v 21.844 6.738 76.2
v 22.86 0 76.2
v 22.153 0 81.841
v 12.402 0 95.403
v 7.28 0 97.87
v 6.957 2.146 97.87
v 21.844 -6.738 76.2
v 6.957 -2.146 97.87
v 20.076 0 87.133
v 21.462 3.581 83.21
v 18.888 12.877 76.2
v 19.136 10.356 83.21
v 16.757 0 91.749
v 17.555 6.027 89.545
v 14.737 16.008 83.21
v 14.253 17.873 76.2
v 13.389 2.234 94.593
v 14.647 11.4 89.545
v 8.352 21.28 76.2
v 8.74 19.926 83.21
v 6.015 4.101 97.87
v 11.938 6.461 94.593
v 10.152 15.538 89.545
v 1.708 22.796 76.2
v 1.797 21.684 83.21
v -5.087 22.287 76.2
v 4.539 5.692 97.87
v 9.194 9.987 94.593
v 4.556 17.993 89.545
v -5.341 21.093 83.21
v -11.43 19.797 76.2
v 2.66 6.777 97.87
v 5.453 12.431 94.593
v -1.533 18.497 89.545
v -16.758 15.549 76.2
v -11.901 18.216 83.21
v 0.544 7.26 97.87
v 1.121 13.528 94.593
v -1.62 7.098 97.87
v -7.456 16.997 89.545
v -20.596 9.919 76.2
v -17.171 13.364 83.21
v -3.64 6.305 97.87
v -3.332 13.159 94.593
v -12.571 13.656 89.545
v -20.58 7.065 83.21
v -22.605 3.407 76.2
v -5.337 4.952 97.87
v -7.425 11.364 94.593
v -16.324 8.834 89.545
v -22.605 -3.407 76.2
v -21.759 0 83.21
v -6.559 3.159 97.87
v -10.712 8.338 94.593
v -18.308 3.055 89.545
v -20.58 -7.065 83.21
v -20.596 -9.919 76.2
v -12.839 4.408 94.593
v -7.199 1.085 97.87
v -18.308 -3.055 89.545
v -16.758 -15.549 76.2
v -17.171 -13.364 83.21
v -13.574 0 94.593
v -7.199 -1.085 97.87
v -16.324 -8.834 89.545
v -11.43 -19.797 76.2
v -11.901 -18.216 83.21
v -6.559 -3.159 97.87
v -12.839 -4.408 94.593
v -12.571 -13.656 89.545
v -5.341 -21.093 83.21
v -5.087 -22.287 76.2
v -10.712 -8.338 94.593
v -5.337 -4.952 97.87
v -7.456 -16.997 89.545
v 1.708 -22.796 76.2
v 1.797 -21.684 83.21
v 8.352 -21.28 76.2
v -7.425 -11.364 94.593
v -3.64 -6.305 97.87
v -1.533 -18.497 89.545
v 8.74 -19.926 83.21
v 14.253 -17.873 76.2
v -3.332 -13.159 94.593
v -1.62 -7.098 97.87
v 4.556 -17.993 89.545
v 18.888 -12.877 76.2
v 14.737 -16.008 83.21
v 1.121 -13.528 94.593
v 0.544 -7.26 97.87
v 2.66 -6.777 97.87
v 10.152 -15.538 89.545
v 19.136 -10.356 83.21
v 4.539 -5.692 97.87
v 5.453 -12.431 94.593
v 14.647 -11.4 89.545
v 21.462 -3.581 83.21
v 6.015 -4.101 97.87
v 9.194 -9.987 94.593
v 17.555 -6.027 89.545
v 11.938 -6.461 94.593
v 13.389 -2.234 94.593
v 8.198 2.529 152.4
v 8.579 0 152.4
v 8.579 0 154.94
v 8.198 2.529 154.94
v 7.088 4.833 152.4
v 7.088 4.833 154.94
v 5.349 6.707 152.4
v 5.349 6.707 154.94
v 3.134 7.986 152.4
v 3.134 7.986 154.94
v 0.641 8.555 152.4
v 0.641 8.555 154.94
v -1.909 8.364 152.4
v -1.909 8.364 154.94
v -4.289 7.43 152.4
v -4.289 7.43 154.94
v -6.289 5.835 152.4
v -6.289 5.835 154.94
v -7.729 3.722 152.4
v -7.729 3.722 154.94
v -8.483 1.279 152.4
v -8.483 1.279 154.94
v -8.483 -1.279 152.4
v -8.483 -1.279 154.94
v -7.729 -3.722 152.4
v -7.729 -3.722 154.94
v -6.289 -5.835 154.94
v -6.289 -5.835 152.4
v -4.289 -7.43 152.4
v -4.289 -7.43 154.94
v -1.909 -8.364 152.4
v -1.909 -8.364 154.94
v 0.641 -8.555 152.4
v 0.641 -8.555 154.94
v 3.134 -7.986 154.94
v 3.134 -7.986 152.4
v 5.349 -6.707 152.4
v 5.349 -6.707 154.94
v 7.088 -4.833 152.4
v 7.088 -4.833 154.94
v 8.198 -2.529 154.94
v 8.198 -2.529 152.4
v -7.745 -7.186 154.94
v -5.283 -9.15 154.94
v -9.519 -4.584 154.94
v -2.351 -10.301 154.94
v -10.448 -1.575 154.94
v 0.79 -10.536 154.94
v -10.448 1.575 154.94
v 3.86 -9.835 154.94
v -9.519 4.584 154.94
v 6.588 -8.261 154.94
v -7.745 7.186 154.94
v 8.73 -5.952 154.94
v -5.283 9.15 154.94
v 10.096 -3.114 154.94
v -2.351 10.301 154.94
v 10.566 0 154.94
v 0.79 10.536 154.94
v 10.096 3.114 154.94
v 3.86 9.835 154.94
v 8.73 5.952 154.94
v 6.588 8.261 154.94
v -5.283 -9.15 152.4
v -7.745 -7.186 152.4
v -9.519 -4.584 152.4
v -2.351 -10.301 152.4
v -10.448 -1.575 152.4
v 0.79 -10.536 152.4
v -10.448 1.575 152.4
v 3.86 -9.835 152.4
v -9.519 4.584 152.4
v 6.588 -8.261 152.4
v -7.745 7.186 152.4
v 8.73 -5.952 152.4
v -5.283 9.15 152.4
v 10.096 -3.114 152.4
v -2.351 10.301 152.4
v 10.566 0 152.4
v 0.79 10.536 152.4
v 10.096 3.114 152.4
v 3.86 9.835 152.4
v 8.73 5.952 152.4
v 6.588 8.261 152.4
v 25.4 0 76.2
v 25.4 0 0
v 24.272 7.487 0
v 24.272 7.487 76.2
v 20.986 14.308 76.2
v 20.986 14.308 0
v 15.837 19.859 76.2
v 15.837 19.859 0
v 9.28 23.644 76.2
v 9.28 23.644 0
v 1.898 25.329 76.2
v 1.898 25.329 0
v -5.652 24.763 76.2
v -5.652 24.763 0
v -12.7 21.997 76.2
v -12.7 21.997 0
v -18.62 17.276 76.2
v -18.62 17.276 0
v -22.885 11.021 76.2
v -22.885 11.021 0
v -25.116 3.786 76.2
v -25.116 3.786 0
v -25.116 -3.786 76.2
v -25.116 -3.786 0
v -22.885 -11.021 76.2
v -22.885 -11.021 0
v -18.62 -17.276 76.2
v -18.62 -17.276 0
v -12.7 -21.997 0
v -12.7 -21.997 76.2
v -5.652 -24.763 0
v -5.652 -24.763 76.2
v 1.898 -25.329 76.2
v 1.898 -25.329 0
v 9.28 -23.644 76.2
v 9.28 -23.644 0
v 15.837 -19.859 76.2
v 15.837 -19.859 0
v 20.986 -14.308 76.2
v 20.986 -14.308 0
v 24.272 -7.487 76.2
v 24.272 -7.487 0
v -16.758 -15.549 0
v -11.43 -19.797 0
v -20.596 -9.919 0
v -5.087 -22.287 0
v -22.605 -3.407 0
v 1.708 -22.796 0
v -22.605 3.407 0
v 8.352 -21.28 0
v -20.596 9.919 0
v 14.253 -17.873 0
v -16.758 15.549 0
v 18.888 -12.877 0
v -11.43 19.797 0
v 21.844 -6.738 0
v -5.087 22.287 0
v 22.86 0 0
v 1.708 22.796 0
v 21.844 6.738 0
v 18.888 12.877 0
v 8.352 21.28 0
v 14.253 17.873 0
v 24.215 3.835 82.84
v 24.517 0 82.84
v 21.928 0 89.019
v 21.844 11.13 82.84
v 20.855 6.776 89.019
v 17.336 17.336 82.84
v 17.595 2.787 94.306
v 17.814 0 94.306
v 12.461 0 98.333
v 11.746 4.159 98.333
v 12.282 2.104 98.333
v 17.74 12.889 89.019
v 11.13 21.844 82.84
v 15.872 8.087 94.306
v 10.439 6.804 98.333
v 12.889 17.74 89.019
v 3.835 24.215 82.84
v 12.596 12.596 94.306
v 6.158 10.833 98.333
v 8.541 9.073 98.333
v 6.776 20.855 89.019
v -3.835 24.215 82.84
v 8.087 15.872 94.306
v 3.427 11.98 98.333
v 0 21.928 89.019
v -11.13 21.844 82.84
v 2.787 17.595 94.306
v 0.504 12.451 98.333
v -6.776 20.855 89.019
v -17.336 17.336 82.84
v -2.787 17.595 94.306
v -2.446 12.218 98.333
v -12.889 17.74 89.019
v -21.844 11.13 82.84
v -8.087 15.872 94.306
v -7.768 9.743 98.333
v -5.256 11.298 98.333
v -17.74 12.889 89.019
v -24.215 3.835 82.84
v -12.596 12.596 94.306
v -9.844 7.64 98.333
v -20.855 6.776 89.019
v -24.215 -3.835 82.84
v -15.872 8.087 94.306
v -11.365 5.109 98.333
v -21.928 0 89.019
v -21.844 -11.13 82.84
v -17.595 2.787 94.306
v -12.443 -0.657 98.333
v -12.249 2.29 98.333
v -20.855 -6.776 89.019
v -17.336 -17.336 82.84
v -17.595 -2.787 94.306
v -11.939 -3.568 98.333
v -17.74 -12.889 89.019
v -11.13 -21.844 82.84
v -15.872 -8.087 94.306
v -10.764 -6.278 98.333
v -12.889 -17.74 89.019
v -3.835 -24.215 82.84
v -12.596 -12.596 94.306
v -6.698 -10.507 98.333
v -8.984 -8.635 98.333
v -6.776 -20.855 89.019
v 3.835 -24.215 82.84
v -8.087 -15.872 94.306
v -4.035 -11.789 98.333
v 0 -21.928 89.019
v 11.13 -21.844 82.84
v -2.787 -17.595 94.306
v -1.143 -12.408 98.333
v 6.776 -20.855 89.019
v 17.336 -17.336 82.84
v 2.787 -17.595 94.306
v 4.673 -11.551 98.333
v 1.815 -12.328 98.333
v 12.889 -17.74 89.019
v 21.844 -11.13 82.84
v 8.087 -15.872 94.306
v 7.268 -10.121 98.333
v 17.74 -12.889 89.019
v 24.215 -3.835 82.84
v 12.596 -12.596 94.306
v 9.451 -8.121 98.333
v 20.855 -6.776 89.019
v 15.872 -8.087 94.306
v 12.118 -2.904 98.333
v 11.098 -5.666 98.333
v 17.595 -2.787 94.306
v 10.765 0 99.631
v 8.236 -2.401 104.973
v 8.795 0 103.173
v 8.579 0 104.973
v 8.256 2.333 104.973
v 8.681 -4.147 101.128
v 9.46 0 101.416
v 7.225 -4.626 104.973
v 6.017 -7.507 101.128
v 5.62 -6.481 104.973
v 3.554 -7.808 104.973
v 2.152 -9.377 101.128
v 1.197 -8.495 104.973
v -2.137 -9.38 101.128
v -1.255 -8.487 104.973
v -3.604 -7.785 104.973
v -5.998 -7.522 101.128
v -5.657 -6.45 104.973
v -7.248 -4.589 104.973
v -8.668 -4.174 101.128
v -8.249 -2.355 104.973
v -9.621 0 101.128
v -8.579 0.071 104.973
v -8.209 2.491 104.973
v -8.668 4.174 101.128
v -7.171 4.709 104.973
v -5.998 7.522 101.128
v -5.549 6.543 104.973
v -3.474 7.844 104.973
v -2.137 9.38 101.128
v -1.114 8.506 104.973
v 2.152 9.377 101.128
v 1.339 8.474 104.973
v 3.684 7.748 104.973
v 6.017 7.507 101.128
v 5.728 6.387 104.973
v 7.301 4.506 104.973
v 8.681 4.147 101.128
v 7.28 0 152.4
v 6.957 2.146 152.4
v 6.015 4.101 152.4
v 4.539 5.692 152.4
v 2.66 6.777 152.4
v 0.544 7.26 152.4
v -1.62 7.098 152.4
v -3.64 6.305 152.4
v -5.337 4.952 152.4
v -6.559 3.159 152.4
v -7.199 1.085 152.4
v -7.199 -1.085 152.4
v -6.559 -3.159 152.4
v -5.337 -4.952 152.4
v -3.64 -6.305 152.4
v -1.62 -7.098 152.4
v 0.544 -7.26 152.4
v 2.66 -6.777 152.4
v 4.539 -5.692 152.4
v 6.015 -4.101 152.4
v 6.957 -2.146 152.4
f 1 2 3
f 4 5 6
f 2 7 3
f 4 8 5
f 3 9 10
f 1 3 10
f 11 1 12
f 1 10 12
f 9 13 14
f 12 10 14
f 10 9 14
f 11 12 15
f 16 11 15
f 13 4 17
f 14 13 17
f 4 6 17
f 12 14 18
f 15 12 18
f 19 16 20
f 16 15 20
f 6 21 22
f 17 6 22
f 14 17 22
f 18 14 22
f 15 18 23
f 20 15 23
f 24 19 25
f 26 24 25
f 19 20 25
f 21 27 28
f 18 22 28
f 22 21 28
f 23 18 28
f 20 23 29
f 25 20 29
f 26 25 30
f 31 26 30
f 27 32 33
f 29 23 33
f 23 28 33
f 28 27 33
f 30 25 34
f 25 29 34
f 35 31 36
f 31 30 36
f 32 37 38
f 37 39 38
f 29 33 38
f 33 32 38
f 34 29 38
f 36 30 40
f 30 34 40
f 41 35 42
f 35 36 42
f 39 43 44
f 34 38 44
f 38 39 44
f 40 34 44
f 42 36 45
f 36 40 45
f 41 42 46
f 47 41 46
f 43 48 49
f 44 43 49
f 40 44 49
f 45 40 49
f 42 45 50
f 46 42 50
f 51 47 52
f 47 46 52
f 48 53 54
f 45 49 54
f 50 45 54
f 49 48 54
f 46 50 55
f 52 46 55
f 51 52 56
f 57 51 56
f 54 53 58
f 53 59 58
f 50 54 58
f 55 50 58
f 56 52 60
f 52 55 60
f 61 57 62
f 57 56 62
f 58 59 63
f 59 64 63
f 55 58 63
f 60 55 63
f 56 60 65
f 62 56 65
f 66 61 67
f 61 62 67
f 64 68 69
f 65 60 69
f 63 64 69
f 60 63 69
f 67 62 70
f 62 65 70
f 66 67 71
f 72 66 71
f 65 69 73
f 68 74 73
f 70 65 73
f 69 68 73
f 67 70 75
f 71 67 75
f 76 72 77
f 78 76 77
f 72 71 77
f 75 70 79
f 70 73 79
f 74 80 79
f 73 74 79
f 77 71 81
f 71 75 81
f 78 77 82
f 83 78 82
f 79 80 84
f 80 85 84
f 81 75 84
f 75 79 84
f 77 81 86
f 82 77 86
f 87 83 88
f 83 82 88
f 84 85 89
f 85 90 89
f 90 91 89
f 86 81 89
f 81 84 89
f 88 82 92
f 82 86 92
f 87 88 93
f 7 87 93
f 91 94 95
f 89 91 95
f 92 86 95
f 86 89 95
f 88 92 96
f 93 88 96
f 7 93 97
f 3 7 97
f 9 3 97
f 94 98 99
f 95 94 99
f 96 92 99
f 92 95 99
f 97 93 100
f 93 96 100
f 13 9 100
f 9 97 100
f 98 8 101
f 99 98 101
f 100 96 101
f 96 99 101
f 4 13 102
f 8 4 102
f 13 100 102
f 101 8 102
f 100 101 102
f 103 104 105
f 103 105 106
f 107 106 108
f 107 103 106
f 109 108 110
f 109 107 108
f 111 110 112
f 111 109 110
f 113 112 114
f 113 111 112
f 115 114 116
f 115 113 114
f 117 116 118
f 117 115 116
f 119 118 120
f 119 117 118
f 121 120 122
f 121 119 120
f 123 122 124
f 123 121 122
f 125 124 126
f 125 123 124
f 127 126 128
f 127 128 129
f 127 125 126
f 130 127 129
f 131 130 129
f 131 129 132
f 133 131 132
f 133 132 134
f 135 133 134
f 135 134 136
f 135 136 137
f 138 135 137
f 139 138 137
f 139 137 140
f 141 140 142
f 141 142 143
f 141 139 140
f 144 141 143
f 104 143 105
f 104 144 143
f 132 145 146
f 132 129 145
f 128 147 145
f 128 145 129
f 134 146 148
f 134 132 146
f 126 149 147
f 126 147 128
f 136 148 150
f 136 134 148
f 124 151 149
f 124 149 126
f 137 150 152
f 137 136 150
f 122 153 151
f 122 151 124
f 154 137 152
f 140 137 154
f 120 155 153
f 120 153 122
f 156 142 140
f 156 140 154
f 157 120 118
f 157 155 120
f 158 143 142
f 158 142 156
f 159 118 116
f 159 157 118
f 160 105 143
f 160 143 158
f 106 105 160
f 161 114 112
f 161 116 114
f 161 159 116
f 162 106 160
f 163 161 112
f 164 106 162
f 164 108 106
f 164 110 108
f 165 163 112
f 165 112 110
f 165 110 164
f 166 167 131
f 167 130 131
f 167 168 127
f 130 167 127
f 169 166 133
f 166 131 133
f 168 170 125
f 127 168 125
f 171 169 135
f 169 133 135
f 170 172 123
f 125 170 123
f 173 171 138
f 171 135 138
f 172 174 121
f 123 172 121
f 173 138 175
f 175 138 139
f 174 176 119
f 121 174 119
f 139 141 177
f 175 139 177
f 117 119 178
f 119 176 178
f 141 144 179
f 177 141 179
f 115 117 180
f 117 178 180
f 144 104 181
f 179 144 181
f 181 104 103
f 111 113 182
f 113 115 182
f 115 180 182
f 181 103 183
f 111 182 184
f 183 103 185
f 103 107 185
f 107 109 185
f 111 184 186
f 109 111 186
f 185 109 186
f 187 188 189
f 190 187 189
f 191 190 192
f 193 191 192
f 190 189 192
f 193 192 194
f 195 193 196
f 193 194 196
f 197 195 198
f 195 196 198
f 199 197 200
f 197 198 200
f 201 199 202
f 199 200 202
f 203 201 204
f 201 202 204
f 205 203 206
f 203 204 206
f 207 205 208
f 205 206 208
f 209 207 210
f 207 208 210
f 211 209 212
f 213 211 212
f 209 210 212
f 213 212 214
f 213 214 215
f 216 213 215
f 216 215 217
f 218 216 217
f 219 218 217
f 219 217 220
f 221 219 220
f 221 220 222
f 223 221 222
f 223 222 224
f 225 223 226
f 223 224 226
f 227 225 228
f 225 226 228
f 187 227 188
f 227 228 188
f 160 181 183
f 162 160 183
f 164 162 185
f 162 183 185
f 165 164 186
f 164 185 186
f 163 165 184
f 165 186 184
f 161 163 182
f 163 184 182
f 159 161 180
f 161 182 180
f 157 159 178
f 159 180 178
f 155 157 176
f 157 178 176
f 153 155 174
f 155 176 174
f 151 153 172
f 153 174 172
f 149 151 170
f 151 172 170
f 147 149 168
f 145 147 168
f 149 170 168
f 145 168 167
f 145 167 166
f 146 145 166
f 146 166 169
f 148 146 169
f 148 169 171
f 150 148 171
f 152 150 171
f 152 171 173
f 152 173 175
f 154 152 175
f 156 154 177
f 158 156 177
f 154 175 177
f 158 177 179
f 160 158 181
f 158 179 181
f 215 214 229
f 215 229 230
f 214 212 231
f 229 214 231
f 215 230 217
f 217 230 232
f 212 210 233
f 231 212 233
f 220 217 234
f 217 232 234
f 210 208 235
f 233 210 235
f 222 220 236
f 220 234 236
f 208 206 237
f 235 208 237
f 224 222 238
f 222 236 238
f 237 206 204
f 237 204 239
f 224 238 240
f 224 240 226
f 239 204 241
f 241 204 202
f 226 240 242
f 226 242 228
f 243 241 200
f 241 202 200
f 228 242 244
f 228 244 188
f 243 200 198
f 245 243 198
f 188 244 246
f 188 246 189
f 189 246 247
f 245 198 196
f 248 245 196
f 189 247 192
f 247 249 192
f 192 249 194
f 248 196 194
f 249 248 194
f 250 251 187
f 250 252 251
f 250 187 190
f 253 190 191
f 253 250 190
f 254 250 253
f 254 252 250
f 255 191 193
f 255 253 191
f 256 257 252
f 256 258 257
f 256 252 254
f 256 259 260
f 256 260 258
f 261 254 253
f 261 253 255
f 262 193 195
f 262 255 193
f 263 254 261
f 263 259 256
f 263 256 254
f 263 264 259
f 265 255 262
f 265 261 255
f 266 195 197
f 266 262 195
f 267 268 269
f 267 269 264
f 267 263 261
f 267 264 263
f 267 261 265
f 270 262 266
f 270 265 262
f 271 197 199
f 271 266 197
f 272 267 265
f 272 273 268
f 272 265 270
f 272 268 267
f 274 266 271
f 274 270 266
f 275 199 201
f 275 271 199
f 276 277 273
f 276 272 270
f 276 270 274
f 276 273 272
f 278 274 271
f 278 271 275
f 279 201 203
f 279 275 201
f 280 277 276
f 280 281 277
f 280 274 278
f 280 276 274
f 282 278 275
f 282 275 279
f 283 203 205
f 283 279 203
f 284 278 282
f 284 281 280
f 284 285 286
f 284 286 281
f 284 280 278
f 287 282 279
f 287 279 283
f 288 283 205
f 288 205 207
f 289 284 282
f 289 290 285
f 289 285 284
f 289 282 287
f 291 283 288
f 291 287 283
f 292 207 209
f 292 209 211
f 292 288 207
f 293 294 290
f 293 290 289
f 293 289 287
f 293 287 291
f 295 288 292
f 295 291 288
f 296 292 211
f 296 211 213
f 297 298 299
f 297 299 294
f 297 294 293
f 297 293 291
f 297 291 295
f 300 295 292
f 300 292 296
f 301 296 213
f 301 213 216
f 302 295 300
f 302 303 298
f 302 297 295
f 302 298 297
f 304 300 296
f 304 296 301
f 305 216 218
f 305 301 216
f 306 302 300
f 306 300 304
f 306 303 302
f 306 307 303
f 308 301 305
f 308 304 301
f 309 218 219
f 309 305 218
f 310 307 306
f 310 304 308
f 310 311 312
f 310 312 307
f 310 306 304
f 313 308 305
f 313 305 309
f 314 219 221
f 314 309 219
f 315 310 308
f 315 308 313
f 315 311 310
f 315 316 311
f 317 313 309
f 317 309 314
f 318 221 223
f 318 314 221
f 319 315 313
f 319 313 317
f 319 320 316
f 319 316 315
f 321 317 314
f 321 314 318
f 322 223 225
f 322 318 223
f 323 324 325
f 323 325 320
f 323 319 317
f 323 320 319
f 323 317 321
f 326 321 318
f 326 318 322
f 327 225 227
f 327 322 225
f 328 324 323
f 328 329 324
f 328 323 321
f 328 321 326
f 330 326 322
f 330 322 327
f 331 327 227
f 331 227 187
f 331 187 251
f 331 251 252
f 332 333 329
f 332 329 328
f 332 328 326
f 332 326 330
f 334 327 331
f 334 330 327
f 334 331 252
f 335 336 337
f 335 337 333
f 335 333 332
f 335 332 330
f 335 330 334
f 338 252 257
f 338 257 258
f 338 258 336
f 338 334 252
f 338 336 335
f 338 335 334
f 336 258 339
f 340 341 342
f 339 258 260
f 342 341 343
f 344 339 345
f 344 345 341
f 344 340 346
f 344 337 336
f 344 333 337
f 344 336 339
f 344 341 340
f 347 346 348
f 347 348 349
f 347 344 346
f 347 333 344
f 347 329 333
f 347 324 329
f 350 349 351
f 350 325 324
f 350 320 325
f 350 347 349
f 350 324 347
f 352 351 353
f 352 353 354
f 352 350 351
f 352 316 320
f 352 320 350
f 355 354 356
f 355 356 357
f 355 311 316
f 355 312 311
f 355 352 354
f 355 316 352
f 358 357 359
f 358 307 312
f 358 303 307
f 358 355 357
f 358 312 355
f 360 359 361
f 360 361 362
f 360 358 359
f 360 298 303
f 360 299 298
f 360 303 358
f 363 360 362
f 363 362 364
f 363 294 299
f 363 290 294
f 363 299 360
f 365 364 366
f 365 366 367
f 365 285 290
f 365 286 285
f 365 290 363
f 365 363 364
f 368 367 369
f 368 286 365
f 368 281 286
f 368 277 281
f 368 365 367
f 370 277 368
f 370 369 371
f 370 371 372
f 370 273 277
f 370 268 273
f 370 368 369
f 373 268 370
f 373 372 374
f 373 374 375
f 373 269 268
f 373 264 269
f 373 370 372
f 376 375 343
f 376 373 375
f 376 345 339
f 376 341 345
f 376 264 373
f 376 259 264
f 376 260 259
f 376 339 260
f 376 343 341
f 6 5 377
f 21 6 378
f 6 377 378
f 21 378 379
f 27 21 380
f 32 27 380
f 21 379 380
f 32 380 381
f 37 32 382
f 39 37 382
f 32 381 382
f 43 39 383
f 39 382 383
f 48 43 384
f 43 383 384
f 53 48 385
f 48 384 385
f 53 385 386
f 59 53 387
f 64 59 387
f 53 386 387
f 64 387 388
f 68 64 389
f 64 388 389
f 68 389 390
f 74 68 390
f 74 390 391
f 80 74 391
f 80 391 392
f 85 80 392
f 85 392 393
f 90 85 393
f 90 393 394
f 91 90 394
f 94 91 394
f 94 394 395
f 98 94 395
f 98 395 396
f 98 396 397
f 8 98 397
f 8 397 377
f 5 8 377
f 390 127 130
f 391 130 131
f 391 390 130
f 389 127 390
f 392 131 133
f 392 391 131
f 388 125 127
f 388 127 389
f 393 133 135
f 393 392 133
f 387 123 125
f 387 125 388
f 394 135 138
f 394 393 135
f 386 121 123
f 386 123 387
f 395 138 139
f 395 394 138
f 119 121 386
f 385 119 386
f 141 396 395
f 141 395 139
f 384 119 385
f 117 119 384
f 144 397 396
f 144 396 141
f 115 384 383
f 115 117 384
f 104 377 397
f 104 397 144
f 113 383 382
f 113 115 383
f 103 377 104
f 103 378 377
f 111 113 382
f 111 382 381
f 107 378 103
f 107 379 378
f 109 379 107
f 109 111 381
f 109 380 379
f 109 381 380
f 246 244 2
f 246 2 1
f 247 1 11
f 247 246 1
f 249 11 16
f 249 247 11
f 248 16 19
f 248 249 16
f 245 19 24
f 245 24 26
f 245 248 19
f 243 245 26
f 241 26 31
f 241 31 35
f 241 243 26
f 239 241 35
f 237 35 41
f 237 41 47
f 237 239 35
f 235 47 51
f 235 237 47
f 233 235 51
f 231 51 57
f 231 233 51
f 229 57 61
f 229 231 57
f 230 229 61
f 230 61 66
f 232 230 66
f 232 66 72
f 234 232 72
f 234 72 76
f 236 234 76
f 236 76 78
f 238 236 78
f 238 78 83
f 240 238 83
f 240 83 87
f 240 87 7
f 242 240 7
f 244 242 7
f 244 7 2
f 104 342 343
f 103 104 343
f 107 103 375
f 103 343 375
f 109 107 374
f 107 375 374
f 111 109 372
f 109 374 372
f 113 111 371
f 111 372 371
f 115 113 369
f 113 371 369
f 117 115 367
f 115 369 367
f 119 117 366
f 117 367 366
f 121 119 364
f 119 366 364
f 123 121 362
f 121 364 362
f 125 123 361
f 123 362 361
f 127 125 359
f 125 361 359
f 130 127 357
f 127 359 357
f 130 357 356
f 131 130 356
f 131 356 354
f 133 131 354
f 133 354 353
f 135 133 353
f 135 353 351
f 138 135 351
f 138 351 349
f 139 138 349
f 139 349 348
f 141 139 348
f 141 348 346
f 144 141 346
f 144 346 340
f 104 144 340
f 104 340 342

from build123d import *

# Parameters (mm, degrees)
F0_R      = 25.4
F1_DEPTH  = 101.6
F2_R      = 25.4
F3_R      = 8.5789654835
F4_DEPTH  = 152.4
F5_T      = -2.54
F6_R      = 7.62
F7_R      = 10.5656442456
F7_R_2    = 8.5789654835
F8_DEPTH  = 2.54
F9_R      = 7.2801716461
F10_DEPTH = 76.2


with BuildPart() as f1:
    # F0 (on Top) → F1 (new body)
    with BuildSketch(Plane.XY):
        Circle(F0_R)
    extrude(amount=F1_DEPTH)

    # F2
    f2_edges = [f1.edges().sort_by_distance(p)[0] for p in [
        (-25.4, 0, 101.6),
    ]]
    fillet(f2_edges, radius=F2_R)

    # F3 (on Top) → F4 (join)
    with BuildSketch(Plane.XY):
        Circle(F3_R)
    extrude(amount=F4_DEPTH)

    # F5
    f5_openings = [f1.faces().sort_by_distance(p)[0] for p in [
        (0, 0, 0),
    ]]
    offset(amount=F5_T, openings=f5_openings, kind=Kind.INTERSECTION)

    # F6
    f6_edges = [f1.edges().sort_by_distance(p)[0] for p in [
        (-8.578965, 0, 100.107349),
    ]]
    fillet(f6_edges, radius=F6_R)

    # F9 (on face) → F10 (cut)
    with BuildSketch(Plane.XY.offset(152.4)):
        Circle(F9_R)
    extrude(amount=-F10_DEPTH, mode=Mode.SUBTRACT)


with BuildPart() as f8:
    # F7 (on face) → F8 (new body)
    with BuildSketch(Plane.XY.offset(152.4)):
        Circle(F7_R)
        Circle(F7_R_2, mode=Mode.SUBTRACT)
    extrude(amount=F8_DEPTH)


solid = Compound([f1.part, f8.part])
